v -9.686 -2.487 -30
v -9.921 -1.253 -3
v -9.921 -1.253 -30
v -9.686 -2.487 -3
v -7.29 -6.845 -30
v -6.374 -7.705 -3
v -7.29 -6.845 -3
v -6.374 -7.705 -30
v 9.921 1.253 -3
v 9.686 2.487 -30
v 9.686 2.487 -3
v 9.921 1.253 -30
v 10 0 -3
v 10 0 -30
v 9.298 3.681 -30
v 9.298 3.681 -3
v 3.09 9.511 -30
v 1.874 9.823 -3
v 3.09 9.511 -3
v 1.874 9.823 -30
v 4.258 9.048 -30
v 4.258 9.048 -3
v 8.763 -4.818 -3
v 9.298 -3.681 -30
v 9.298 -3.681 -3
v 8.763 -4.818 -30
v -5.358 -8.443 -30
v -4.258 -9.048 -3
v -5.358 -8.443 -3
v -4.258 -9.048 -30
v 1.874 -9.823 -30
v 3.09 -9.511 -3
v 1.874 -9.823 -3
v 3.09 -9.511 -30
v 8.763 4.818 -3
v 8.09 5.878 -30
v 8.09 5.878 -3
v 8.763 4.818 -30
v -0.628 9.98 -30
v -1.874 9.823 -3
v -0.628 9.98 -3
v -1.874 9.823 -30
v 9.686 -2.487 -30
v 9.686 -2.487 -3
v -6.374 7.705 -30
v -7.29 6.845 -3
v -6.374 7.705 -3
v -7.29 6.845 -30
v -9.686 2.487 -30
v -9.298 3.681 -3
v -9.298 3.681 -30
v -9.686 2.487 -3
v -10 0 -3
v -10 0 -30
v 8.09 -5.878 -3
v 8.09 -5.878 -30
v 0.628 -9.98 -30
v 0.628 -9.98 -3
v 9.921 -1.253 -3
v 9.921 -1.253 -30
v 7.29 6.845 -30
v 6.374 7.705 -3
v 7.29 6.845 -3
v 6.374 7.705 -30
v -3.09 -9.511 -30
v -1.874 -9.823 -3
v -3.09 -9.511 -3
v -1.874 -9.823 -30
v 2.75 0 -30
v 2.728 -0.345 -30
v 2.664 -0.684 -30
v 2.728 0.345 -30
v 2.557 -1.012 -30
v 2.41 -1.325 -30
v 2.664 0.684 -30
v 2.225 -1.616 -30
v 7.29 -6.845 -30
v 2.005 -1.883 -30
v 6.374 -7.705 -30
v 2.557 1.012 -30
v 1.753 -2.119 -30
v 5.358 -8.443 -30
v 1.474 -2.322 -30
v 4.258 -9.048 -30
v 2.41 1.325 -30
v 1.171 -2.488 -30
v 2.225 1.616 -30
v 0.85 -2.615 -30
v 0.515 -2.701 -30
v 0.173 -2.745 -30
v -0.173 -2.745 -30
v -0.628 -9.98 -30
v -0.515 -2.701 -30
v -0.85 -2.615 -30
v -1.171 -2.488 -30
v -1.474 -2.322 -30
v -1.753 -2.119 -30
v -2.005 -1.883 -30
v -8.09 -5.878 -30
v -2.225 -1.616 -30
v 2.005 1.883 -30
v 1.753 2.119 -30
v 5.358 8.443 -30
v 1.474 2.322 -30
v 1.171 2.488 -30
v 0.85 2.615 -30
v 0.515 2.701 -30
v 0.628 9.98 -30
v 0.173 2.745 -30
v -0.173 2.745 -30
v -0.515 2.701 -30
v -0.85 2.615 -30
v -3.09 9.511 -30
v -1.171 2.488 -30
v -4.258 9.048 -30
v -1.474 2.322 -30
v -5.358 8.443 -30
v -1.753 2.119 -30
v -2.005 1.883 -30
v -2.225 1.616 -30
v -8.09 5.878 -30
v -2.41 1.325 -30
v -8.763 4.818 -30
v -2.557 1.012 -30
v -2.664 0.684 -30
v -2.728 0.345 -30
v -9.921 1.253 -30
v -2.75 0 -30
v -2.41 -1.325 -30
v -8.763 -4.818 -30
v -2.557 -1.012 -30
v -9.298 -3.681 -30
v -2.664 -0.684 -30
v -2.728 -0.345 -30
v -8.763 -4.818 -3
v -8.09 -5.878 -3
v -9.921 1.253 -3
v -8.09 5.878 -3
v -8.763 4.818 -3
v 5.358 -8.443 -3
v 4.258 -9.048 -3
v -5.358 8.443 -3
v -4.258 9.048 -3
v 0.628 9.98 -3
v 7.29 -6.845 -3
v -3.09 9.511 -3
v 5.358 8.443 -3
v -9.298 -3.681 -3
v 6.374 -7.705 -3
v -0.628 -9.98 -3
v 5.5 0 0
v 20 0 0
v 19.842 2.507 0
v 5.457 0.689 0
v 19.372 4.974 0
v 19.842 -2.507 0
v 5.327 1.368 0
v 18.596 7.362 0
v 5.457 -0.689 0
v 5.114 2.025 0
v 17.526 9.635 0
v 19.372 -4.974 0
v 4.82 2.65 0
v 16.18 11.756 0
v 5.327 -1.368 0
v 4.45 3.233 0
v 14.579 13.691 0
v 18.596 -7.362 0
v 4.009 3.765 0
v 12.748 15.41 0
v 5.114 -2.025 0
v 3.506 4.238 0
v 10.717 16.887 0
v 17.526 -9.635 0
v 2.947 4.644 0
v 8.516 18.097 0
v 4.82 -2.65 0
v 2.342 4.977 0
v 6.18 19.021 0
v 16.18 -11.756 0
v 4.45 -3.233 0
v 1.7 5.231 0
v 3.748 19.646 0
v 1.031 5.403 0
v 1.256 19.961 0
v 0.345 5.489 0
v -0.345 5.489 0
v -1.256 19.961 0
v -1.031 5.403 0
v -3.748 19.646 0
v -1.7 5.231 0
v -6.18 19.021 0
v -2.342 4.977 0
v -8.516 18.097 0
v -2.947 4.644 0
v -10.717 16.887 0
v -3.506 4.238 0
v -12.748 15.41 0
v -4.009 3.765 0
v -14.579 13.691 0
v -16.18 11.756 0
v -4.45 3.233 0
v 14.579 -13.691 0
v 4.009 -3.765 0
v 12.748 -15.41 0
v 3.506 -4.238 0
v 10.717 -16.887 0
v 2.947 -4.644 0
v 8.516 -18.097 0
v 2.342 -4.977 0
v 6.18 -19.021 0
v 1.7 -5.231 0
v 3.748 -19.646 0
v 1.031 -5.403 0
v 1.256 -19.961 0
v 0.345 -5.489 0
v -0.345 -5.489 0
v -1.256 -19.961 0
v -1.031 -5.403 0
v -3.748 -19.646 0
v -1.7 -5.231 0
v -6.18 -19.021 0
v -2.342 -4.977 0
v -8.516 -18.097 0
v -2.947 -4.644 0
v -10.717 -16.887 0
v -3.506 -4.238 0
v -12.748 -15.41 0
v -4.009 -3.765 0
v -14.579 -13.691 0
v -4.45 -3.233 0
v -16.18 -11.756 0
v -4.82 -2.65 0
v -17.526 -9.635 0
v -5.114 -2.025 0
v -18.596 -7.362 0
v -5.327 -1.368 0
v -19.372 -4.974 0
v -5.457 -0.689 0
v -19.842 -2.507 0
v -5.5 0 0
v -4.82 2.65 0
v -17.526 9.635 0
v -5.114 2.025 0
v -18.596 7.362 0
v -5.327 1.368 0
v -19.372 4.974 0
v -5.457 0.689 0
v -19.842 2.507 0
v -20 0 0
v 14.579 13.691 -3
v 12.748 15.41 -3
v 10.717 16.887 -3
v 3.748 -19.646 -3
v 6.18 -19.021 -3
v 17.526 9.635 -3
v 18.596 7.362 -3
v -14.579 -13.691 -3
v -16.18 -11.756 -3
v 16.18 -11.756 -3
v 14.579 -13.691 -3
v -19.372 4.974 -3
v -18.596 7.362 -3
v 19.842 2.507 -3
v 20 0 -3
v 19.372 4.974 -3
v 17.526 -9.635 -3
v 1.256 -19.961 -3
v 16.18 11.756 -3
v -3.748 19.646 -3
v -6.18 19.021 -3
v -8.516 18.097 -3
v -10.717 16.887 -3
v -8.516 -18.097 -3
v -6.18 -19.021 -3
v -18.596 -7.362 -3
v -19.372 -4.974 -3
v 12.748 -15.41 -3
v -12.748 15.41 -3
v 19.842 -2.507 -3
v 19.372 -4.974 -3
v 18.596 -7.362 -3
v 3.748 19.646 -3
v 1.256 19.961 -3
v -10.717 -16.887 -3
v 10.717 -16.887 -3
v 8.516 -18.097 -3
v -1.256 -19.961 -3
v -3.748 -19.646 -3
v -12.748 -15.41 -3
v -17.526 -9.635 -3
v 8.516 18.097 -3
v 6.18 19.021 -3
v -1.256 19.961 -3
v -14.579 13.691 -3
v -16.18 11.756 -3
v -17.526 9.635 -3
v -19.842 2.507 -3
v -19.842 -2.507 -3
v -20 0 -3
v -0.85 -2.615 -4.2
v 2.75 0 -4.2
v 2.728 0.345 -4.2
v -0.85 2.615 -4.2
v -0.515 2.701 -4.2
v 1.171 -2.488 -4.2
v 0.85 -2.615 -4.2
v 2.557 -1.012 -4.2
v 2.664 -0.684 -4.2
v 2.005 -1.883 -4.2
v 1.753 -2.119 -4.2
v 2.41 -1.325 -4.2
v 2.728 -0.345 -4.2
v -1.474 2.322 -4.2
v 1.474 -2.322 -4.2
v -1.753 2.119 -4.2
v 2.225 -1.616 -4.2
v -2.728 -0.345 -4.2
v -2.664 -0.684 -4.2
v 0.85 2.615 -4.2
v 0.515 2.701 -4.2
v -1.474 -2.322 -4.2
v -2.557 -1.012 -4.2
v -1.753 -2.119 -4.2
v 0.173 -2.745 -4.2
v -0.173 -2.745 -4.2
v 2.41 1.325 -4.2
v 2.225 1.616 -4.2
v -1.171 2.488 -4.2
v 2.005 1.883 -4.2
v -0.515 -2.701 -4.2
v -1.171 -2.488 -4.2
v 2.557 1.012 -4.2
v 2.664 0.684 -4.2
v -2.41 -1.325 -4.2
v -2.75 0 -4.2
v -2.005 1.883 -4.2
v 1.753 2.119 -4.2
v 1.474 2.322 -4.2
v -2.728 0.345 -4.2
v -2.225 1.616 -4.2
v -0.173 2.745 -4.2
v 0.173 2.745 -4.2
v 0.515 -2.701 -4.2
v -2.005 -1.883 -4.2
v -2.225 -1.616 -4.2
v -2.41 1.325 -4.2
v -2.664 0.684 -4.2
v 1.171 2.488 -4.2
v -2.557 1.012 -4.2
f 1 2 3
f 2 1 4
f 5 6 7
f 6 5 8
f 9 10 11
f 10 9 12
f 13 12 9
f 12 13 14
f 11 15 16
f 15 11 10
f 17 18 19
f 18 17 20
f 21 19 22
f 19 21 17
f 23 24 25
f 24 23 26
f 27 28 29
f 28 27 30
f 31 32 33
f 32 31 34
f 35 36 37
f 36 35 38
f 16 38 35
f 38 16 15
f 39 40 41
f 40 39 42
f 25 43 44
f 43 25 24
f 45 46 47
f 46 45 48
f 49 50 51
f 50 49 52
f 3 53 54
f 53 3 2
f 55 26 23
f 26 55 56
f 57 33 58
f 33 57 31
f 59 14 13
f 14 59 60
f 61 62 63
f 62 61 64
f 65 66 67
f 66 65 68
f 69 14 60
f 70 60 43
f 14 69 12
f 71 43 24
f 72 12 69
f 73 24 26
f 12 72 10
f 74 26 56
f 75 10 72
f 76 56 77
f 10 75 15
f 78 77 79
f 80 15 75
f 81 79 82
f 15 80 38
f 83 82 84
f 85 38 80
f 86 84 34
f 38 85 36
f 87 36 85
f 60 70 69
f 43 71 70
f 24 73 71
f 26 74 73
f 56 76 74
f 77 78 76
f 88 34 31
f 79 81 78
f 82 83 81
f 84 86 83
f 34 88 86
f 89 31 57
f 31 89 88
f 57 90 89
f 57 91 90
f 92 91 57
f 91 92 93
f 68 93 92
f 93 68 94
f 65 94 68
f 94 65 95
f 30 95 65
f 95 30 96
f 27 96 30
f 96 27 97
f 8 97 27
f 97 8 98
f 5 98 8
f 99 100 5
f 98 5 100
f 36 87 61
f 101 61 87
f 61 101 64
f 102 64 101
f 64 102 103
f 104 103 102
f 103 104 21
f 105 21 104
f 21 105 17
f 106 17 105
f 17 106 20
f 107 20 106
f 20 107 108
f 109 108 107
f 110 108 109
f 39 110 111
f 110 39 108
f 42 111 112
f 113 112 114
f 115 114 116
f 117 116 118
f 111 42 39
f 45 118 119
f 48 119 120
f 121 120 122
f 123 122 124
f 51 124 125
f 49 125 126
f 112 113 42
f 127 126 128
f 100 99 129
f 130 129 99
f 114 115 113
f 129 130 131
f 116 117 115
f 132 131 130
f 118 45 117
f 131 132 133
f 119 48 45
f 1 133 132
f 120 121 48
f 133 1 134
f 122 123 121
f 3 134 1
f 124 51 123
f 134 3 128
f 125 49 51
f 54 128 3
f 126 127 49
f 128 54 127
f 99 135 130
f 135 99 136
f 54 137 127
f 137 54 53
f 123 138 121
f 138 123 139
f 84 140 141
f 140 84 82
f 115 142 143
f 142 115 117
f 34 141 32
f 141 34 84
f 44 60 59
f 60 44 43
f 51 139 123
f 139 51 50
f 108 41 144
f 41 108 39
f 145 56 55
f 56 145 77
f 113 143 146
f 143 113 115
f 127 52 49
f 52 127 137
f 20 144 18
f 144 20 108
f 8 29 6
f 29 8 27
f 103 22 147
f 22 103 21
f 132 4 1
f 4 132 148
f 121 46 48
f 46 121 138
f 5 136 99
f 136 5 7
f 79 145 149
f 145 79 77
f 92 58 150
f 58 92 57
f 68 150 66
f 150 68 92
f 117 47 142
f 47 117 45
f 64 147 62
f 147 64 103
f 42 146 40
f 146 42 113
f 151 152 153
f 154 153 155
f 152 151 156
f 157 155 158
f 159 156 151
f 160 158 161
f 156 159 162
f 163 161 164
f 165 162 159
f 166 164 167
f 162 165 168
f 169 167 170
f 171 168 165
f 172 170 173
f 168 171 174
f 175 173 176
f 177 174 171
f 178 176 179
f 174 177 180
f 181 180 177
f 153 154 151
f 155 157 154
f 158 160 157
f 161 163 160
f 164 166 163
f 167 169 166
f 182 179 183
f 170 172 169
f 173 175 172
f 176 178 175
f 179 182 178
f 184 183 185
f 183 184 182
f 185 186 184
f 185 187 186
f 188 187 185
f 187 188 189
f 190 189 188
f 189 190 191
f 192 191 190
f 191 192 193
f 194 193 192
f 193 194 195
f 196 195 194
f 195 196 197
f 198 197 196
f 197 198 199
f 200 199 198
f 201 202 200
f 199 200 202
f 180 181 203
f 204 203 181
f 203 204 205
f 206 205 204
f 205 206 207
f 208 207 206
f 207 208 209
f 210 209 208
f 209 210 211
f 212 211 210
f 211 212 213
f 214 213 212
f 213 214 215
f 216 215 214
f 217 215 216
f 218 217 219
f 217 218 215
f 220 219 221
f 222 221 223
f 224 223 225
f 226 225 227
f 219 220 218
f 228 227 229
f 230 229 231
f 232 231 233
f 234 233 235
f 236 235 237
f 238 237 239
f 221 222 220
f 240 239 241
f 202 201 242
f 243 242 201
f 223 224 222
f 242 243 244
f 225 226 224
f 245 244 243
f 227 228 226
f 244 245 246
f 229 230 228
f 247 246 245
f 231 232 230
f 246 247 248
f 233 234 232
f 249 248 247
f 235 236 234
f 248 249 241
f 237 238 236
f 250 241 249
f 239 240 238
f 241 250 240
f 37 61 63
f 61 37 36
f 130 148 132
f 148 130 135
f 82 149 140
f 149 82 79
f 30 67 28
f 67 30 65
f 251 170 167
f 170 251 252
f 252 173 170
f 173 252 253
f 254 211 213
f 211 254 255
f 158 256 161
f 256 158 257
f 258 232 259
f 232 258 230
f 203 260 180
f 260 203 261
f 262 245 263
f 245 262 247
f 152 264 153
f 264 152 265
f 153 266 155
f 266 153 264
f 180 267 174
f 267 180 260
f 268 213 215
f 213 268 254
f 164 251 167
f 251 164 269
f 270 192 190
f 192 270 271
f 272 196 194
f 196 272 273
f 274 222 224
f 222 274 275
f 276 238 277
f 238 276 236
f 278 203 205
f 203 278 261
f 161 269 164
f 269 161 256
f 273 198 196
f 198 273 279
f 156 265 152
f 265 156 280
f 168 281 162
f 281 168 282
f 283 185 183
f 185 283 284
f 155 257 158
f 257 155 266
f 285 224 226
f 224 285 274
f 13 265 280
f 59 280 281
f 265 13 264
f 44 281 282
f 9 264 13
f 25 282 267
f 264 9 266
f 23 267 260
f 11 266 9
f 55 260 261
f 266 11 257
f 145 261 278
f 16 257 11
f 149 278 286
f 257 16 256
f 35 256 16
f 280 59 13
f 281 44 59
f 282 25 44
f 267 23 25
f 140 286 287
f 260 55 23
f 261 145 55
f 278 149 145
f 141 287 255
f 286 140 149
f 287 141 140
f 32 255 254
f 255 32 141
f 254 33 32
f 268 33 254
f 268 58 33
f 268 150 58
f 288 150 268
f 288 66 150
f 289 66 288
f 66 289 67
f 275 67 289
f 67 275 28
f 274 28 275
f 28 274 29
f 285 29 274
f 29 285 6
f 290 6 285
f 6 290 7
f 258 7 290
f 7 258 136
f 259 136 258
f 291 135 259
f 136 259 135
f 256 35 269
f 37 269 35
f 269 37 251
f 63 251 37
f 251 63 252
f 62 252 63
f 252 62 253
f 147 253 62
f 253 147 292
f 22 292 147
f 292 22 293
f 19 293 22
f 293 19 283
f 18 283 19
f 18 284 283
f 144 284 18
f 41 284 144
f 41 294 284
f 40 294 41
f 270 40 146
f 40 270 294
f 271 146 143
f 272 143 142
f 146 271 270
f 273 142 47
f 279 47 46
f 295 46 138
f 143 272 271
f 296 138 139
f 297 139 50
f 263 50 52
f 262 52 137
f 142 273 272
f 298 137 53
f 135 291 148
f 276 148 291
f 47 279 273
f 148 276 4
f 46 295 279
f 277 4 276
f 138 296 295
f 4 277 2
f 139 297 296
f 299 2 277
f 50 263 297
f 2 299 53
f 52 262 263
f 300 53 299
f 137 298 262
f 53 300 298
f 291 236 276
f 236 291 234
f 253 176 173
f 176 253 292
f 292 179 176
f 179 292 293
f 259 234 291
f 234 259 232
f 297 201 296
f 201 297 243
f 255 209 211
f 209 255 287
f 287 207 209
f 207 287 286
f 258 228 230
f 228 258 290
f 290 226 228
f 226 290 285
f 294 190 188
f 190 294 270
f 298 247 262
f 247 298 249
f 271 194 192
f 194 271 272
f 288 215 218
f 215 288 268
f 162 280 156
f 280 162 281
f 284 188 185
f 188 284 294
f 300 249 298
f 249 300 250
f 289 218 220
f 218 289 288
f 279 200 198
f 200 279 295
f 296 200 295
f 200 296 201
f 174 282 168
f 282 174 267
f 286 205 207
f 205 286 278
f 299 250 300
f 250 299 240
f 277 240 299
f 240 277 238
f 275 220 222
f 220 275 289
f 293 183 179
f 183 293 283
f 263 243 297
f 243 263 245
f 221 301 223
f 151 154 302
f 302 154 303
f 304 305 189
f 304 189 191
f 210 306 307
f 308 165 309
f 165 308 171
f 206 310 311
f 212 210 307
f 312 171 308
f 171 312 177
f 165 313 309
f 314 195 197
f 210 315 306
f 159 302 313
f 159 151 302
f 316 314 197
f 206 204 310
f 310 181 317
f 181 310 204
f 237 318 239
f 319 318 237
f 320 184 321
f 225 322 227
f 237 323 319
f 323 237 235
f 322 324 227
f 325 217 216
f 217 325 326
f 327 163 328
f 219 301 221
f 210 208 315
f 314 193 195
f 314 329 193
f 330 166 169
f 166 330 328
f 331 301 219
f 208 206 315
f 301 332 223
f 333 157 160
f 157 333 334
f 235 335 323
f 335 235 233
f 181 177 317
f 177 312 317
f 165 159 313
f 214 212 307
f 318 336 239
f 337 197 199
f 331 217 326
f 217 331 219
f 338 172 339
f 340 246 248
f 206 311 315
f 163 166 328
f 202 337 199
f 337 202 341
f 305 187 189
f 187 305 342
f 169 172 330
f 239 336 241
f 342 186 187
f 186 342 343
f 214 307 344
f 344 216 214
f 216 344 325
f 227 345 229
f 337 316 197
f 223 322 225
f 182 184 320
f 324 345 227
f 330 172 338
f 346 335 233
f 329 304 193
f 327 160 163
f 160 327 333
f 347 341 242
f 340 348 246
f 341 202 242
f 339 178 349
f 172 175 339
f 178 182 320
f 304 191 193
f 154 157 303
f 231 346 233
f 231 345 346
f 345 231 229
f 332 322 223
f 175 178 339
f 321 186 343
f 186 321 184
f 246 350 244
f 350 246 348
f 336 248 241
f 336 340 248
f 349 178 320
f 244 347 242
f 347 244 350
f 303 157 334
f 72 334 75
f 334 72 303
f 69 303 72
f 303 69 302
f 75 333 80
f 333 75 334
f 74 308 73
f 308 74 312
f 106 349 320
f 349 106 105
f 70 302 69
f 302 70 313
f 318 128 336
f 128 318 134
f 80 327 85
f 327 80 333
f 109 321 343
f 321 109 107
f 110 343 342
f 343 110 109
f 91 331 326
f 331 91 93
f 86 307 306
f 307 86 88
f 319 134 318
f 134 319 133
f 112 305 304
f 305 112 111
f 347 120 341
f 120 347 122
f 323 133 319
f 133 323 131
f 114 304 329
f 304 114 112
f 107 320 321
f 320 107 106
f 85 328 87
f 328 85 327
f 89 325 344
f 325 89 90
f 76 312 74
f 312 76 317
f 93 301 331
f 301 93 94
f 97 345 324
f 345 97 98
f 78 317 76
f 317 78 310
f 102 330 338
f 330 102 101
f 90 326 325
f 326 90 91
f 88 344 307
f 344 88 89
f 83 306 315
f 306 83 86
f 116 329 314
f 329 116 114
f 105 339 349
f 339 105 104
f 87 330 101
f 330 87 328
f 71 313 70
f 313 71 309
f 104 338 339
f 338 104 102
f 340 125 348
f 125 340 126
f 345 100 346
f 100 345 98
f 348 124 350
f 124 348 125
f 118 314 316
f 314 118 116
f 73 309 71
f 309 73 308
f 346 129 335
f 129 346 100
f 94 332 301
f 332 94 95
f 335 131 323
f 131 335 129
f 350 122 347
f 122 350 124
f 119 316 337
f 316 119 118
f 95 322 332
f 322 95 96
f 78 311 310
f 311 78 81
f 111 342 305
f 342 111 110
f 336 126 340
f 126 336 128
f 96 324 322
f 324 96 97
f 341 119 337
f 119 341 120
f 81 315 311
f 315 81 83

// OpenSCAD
$fn = 50;


difference() {
	union() {
		translate(v = [0, 0, -30.0000000000]) {
			cylinder(h = 30, r = 10.0000000000);
		}
		translate(v = [0, 0, -3.0000000000]) {
			cylinder(h = 3, r = 20.0000000000);
		}
	}
	union() {
		translate(v = [0, 0, 0]) {
			rotate(a = [0, 0, 0]) {
				difference() {
					union() {
						#translate(v = [0, 0, -30.0000000000]) {
							cylinder(h = 30, r = 2.2500000000);
						}
						#translate(v = [0, 0, -4.2000000000]) {
							cylinder(h = 4.2000000000, r1 = 2.7500000000, r2 = 5.5000000000);
						}
						#translate(v = [0, 0, -30.0000000000]) {
							cylinder(h = 30, r = 2.7500000000);
						}
						#translate(v = [0, 0, -30.0000000000]) {
							cylinder(h = 30, r = 2.2500000000);
						}
					}
					union();
				}
			}
		}
	}
}
